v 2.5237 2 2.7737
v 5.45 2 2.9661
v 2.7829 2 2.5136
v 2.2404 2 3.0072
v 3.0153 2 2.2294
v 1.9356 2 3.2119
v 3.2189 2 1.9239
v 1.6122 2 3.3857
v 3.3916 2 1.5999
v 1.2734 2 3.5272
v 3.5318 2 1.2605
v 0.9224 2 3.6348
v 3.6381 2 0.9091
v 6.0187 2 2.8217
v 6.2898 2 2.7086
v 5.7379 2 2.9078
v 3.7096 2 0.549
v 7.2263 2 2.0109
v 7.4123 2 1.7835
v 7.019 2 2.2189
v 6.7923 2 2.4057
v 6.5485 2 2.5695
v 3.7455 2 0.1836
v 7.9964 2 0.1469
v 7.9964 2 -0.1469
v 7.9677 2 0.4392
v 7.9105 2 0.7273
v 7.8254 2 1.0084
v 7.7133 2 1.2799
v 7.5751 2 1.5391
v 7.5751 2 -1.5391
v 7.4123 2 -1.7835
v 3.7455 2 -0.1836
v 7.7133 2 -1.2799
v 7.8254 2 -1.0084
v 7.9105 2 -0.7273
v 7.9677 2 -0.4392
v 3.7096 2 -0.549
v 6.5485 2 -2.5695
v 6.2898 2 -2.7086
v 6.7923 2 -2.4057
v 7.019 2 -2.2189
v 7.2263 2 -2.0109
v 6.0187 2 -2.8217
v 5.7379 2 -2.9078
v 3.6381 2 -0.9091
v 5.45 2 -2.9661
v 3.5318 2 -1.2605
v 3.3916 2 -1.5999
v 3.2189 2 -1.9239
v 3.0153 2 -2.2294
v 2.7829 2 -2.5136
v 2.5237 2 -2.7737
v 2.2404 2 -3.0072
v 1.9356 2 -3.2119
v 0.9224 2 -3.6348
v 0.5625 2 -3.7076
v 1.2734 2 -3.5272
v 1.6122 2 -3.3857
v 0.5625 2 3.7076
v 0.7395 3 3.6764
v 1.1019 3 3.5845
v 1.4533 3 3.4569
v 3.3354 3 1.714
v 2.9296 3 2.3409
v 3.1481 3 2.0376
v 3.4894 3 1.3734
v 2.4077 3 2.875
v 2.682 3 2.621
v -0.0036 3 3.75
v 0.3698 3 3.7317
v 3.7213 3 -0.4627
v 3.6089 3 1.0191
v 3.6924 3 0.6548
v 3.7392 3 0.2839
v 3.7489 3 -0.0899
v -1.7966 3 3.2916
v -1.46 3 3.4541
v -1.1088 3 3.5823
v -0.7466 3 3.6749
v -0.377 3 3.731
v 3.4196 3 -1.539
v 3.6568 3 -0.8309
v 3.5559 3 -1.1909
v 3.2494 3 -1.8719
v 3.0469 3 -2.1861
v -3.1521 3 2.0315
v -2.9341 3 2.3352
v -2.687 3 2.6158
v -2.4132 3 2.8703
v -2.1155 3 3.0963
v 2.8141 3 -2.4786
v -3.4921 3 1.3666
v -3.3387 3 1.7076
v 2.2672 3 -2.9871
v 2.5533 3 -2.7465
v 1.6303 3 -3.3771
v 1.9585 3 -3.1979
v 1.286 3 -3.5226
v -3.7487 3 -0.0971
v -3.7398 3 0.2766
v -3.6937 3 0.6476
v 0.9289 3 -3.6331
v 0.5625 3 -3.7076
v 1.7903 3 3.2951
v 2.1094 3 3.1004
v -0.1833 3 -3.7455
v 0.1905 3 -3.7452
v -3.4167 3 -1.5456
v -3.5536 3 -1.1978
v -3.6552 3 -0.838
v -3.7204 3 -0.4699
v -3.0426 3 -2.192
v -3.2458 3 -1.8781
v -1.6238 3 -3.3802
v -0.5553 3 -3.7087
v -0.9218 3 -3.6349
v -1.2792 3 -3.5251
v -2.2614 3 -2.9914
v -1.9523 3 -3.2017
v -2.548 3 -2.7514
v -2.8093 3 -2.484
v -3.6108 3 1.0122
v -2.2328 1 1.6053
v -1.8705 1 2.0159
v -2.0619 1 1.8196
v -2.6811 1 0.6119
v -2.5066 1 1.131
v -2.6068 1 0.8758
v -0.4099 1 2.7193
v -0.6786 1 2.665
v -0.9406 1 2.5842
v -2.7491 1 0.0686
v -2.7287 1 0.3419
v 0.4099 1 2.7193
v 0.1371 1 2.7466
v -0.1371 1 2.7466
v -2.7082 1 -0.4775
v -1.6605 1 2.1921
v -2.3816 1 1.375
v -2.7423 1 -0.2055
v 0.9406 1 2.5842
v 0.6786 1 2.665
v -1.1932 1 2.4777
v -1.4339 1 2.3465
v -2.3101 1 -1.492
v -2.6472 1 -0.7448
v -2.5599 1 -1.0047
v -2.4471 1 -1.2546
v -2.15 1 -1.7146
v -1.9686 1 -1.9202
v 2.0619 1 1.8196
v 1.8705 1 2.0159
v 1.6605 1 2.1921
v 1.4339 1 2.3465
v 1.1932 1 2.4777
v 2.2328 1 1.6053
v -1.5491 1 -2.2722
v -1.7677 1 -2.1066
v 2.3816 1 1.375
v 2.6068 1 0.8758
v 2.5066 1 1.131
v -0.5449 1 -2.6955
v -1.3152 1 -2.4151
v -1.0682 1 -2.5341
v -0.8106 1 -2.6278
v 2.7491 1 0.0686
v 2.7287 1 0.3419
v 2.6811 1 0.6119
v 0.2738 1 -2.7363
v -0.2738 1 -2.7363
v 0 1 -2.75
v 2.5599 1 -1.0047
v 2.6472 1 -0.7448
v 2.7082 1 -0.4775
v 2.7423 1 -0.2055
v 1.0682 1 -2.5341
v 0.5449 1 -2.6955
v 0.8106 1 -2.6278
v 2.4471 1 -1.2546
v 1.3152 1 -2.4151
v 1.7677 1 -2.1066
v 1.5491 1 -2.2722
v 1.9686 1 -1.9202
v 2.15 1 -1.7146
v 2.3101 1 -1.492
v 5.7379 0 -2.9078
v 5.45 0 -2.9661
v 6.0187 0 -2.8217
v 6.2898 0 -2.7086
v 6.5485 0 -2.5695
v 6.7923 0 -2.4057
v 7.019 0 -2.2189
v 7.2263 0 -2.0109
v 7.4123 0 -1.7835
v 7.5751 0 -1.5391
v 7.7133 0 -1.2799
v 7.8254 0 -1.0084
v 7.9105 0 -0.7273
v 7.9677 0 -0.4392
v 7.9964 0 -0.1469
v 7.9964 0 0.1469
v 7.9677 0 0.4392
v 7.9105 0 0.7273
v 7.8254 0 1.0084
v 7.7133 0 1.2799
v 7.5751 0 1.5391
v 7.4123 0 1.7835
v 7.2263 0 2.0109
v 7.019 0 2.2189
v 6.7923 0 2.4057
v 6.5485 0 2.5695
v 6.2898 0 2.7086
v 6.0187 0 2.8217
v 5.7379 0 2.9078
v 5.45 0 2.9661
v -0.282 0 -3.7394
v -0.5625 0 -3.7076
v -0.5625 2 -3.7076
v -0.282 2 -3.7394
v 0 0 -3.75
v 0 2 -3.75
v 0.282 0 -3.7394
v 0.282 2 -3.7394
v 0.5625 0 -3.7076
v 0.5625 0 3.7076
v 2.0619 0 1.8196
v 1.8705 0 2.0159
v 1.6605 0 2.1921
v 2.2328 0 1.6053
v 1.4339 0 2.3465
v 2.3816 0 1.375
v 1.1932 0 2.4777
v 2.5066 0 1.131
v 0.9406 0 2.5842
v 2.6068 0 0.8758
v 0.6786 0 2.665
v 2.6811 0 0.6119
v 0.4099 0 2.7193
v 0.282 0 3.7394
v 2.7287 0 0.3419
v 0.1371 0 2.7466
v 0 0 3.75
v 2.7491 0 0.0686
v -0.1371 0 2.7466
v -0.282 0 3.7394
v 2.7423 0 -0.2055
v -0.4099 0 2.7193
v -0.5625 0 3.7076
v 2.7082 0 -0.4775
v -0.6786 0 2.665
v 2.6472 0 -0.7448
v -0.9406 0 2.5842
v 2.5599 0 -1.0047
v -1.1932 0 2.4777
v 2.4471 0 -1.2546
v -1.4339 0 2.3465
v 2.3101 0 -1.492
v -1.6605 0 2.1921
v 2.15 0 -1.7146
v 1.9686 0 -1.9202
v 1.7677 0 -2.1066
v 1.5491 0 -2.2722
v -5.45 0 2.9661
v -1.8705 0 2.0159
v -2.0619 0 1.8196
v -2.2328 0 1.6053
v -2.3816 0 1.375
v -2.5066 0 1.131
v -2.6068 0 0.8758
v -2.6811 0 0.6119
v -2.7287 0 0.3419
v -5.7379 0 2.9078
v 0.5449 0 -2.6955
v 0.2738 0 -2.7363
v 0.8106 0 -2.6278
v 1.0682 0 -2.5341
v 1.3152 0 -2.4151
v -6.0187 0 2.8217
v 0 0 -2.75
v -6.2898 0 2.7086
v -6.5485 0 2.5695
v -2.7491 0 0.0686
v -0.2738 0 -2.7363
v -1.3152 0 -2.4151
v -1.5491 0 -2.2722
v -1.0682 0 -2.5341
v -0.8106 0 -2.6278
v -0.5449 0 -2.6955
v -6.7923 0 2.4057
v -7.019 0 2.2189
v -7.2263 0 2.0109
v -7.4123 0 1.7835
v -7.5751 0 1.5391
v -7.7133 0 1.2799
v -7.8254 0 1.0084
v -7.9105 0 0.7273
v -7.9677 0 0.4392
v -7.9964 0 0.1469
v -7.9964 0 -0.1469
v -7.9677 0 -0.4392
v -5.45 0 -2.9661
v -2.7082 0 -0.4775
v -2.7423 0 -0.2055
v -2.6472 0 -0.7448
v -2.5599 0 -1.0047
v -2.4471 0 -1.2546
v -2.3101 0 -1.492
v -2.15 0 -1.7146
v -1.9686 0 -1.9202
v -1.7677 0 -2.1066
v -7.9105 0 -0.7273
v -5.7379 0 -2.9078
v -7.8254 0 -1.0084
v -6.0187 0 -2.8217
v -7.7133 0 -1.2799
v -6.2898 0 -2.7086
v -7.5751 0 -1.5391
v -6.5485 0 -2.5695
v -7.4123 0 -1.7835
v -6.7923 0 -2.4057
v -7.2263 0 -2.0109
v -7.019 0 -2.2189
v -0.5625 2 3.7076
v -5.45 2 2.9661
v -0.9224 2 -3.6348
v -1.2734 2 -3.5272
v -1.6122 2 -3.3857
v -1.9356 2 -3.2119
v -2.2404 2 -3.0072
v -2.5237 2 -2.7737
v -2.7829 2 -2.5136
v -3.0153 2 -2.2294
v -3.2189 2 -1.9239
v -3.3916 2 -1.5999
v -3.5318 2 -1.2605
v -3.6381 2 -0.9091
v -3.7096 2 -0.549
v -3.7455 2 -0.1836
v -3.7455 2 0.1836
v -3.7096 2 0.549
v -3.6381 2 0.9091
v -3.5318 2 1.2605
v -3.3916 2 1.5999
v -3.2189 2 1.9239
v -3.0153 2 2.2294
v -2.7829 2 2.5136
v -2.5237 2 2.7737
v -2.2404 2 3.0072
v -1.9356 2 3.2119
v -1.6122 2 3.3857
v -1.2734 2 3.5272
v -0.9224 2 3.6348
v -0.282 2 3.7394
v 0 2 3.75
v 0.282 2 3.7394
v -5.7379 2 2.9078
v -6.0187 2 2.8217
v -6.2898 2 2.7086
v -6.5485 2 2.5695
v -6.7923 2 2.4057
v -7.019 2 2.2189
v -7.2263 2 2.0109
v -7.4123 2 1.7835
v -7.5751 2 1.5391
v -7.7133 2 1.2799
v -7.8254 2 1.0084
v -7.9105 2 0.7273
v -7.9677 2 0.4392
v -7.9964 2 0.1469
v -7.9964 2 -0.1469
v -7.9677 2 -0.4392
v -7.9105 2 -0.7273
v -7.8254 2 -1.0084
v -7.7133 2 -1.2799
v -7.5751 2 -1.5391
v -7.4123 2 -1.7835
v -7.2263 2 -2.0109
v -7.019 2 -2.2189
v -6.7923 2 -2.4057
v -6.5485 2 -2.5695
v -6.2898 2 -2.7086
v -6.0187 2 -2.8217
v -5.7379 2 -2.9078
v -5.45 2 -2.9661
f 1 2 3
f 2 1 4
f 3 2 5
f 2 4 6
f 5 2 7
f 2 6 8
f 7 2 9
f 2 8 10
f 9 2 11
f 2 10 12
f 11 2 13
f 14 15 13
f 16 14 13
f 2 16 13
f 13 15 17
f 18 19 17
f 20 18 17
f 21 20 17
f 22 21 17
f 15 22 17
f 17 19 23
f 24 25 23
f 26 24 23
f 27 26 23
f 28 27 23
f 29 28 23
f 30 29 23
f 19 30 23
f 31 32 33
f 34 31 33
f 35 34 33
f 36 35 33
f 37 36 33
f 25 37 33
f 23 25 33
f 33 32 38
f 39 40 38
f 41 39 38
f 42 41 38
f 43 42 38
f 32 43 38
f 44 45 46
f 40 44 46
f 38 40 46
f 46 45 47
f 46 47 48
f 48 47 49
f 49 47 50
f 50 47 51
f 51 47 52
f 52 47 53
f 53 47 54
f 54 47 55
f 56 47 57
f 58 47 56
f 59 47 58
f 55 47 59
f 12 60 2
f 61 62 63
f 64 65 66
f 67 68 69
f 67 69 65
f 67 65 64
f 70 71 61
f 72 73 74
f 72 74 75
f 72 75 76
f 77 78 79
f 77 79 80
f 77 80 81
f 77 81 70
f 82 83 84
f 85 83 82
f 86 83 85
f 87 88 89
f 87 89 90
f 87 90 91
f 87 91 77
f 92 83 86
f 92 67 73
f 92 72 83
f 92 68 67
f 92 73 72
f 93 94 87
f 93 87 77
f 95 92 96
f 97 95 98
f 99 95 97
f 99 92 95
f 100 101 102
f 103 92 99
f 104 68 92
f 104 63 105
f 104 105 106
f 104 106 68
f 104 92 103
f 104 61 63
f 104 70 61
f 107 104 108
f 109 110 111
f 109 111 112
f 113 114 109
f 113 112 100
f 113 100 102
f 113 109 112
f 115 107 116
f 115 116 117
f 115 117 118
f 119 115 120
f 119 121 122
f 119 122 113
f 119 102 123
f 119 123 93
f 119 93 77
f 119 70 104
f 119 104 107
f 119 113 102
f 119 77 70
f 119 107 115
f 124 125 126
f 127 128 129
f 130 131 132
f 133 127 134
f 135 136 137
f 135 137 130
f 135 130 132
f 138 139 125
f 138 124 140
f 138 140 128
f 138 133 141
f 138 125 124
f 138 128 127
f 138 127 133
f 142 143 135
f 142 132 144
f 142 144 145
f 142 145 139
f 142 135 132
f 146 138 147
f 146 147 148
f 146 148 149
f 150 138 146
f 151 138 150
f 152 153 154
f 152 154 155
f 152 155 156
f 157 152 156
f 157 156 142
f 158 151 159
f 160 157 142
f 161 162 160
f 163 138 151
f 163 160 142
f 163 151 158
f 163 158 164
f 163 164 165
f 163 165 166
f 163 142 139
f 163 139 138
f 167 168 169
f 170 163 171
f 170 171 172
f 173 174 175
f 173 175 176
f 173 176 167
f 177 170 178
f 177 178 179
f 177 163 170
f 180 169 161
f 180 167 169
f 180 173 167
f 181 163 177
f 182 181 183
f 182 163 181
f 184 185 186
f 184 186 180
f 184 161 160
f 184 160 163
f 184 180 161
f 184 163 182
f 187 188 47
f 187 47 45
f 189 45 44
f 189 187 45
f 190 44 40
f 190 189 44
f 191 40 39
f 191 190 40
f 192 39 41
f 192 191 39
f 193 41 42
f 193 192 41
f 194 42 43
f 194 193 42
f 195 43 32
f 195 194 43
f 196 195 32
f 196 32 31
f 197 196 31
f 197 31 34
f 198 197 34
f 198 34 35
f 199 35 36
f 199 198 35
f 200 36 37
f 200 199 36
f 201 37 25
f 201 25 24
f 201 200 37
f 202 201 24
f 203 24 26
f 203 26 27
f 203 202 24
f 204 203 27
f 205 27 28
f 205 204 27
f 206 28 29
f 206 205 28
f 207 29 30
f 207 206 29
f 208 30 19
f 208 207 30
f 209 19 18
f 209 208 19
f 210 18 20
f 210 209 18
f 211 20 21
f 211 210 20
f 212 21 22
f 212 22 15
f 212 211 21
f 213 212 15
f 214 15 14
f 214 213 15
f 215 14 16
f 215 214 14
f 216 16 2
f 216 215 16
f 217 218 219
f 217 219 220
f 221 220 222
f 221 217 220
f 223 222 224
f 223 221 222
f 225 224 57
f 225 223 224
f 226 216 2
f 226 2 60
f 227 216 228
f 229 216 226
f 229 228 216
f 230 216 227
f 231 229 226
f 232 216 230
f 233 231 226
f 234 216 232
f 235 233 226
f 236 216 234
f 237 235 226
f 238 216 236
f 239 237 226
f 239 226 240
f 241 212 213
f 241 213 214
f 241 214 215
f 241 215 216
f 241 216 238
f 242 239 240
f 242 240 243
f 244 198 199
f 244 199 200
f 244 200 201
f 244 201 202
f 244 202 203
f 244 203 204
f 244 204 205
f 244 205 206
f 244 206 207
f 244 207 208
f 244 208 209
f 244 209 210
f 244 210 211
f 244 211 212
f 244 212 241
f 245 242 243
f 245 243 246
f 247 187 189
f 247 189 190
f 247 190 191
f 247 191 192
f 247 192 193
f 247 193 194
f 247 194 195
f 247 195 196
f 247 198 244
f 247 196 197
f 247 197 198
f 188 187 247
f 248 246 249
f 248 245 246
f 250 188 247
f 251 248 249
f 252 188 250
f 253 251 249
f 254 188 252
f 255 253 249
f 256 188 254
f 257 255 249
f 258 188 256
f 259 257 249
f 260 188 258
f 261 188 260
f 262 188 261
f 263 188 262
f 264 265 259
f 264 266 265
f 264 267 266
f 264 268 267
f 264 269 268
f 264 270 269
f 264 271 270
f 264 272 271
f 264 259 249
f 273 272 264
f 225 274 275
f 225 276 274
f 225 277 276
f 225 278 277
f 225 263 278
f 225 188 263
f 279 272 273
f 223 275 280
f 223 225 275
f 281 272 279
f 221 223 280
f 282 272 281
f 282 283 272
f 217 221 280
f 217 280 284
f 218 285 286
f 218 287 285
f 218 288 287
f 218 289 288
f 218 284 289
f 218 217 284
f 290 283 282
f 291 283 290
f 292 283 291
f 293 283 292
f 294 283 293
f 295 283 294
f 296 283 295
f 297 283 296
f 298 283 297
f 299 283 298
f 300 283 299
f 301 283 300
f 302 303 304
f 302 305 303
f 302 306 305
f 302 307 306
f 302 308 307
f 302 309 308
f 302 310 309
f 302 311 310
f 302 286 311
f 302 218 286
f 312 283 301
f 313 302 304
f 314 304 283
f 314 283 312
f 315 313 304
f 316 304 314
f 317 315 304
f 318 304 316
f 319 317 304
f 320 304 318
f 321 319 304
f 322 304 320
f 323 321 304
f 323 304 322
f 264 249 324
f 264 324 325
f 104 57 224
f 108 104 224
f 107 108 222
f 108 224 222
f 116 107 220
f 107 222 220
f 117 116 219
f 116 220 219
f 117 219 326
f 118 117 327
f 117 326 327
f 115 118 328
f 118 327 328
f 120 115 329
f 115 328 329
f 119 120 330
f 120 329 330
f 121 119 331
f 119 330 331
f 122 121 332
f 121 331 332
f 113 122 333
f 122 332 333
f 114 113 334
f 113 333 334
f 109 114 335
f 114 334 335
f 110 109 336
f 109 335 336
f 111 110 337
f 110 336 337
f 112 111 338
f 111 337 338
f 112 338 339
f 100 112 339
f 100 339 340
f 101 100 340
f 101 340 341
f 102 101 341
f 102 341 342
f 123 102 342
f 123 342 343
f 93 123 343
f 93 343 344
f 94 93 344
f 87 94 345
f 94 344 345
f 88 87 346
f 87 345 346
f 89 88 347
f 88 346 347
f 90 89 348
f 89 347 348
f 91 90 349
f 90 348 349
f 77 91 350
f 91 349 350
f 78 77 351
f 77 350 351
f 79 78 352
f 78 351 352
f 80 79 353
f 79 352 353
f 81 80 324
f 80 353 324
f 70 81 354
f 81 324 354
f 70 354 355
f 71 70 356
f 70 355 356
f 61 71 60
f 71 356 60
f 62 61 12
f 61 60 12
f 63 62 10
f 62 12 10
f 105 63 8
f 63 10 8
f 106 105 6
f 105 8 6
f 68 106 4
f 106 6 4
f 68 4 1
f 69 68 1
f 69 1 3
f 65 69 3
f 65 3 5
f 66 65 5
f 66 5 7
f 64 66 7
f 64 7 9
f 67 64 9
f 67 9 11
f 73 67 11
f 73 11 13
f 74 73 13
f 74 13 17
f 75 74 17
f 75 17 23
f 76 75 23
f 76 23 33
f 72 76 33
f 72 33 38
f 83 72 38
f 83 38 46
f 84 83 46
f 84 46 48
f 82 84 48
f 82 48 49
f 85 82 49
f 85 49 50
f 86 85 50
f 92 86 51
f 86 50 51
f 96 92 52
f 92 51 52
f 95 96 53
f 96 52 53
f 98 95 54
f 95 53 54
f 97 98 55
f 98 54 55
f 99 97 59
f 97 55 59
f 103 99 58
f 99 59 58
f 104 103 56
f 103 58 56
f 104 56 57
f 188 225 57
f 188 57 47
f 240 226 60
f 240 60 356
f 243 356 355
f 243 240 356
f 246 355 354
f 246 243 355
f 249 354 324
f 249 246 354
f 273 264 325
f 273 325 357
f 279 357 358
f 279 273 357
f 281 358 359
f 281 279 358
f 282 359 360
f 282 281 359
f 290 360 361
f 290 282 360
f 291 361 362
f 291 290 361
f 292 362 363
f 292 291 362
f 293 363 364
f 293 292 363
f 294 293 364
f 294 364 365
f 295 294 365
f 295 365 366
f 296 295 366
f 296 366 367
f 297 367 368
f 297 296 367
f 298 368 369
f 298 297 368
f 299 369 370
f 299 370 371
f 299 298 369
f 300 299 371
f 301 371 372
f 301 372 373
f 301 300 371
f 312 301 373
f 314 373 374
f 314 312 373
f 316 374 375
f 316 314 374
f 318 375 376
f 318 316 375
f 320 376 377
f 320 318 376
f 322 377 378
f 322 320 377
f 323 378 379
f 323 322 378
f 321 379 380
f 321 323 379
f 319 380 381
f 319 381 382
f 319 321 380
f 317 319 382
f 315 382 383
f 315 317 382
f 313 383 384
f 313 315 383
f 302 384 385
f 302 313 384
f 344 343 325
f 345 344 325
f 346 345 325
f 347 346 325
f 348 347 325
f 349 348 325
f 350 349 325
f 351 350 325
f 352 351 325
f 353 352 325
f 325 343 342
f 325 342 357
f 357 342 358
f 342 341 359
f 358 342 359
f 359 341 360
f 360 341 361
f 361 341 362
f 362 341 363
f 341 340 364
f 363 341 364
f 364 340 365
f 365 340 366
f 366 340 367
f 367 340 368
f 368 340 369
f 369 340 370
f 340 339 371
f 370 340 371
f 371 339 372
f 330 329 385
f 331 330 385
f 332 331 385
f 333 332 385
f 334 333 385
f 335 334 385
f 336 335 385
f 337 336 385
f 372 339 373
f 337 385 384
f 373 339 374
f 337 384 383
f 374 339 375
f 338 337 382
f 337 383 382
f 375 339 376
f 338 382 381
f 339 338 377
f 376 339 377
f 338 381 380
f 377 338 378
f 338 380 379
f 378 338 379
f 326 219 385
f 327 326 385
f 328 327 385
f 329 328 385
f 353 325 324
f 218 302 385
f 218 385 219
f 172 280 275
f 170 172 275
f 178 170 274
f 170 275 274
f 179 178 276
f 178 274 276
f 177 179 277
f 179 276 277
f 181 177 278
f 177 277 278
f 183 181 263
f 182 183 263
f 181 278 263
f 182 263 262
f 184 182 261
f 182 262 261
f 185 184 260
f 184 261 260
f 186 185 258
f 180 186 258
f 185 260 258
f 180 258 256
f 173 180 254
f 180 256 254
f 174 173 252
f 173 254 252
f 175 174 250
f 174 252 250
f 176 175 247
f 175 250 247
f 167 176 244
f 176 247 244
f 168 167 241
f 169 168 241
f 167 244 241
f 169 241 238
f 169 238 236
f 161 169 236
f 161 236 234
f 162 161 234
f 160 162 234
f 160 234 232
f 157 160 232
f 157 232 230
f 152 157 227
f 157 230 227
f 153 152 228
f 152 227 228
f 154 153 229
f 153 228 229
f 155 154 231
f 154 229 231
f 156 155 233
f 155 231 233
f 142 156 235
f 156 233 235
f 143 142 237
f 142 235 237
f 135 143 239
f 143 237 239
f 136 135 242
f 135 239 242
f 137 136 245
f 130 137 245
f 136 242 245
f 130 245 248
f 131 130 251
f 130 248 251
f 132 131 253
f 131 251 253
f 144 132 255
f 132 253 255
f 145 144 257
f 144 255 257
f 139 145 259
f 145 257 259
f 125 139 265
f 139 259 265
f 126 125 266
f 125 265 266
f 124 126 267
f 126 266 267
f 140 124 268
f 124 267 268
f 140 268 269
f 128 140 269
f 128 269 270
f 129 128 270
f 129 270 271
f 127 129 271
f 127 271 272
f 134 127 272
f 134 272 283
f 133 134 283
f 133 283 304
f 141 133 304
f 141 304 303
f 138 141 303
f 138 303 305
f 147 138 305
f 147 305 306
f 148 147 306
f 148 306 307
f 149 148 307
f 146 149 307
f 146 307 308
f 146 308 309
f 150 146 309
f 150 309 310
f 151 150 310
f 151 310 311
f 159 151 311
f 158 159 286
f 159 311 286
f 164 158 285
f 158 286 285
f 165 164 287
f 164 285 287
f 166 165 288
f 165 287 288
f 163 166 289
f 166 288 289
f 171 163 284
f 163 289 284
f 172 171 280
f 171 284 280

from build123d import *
from build123d.topology import SkipClean

# Parameters (mm, degrees)
BOSS_EXTRUDE1_DEPTH = 2
SKETCH2_R           = 3.75
BOSS_EXTRUDE2_DEPTH = 1
SKETCH3_R           = 2.75
CUT_EXTRUDE1_DEPTH  = 1


with BuildPart() as part:
    # Sketch1 → Boss-Extrude1 (new body)
    with BuildSketch(Plane(origin=(0, 0, 0), x_dir=(1, 0, 0), z_dir=(0, 1, 0))):
        with BuildLine():
            Line((0.5625, 3.707572487), (5.45, 2.96605799))
            ThreePointArc((5.45, 2.96605799), (8, 0), (5.45, -2.96605799))
            Line((5.45, -2.96605799), (0.5625, -3.707572487))
            ThreePointArc((0.5625, -3.707572487), (0, -3.75), (-0.5625, -3.707572487))
            Line((-0.5625, -3.707572487), (-5.45, -2.96605799))
            ThreePointArc((-5.45, -2.96605799), (-8, 0), (-5.45, 2.96605799))
            Line((-5.45, 2.96605799), (-0.5625, 3.707572487))
            ThreePointArc((-0.5625, 3.707572487), (0, 3.75), (0.5625, 3.707572487))
        make_face()
    extrude(amount=BOSS_EXTRUDE1_DEPTH)

    # Sketch2 → Boss-Extrude2 (add)
    with SkipClean():  # the faces are left unmerged after this step: merging them gives an invalid solid
        with BuildSketch(Plane(origin=(0, 2, 0), x_dir=(1, 0, 0), z_dir=(0, 1, 0))):
            Circle(SKETCH2_R)
        extrude(amount=BOSS_EXTRUDE2_DEPTH)
    add(part.part.scale(1), mode=Mode.REPLACE)  # the faces are merged on a copy

    # Sketch3 → Cut-Extrude1 (cut)
    with BuildSketch(Plane.XZ):
        Circle(SKETCH3_R)
    extrude(amount=-CUT_EXTRUDE1_DEPTH, mode=Mode.SUBTRACT)


solid = part.part
